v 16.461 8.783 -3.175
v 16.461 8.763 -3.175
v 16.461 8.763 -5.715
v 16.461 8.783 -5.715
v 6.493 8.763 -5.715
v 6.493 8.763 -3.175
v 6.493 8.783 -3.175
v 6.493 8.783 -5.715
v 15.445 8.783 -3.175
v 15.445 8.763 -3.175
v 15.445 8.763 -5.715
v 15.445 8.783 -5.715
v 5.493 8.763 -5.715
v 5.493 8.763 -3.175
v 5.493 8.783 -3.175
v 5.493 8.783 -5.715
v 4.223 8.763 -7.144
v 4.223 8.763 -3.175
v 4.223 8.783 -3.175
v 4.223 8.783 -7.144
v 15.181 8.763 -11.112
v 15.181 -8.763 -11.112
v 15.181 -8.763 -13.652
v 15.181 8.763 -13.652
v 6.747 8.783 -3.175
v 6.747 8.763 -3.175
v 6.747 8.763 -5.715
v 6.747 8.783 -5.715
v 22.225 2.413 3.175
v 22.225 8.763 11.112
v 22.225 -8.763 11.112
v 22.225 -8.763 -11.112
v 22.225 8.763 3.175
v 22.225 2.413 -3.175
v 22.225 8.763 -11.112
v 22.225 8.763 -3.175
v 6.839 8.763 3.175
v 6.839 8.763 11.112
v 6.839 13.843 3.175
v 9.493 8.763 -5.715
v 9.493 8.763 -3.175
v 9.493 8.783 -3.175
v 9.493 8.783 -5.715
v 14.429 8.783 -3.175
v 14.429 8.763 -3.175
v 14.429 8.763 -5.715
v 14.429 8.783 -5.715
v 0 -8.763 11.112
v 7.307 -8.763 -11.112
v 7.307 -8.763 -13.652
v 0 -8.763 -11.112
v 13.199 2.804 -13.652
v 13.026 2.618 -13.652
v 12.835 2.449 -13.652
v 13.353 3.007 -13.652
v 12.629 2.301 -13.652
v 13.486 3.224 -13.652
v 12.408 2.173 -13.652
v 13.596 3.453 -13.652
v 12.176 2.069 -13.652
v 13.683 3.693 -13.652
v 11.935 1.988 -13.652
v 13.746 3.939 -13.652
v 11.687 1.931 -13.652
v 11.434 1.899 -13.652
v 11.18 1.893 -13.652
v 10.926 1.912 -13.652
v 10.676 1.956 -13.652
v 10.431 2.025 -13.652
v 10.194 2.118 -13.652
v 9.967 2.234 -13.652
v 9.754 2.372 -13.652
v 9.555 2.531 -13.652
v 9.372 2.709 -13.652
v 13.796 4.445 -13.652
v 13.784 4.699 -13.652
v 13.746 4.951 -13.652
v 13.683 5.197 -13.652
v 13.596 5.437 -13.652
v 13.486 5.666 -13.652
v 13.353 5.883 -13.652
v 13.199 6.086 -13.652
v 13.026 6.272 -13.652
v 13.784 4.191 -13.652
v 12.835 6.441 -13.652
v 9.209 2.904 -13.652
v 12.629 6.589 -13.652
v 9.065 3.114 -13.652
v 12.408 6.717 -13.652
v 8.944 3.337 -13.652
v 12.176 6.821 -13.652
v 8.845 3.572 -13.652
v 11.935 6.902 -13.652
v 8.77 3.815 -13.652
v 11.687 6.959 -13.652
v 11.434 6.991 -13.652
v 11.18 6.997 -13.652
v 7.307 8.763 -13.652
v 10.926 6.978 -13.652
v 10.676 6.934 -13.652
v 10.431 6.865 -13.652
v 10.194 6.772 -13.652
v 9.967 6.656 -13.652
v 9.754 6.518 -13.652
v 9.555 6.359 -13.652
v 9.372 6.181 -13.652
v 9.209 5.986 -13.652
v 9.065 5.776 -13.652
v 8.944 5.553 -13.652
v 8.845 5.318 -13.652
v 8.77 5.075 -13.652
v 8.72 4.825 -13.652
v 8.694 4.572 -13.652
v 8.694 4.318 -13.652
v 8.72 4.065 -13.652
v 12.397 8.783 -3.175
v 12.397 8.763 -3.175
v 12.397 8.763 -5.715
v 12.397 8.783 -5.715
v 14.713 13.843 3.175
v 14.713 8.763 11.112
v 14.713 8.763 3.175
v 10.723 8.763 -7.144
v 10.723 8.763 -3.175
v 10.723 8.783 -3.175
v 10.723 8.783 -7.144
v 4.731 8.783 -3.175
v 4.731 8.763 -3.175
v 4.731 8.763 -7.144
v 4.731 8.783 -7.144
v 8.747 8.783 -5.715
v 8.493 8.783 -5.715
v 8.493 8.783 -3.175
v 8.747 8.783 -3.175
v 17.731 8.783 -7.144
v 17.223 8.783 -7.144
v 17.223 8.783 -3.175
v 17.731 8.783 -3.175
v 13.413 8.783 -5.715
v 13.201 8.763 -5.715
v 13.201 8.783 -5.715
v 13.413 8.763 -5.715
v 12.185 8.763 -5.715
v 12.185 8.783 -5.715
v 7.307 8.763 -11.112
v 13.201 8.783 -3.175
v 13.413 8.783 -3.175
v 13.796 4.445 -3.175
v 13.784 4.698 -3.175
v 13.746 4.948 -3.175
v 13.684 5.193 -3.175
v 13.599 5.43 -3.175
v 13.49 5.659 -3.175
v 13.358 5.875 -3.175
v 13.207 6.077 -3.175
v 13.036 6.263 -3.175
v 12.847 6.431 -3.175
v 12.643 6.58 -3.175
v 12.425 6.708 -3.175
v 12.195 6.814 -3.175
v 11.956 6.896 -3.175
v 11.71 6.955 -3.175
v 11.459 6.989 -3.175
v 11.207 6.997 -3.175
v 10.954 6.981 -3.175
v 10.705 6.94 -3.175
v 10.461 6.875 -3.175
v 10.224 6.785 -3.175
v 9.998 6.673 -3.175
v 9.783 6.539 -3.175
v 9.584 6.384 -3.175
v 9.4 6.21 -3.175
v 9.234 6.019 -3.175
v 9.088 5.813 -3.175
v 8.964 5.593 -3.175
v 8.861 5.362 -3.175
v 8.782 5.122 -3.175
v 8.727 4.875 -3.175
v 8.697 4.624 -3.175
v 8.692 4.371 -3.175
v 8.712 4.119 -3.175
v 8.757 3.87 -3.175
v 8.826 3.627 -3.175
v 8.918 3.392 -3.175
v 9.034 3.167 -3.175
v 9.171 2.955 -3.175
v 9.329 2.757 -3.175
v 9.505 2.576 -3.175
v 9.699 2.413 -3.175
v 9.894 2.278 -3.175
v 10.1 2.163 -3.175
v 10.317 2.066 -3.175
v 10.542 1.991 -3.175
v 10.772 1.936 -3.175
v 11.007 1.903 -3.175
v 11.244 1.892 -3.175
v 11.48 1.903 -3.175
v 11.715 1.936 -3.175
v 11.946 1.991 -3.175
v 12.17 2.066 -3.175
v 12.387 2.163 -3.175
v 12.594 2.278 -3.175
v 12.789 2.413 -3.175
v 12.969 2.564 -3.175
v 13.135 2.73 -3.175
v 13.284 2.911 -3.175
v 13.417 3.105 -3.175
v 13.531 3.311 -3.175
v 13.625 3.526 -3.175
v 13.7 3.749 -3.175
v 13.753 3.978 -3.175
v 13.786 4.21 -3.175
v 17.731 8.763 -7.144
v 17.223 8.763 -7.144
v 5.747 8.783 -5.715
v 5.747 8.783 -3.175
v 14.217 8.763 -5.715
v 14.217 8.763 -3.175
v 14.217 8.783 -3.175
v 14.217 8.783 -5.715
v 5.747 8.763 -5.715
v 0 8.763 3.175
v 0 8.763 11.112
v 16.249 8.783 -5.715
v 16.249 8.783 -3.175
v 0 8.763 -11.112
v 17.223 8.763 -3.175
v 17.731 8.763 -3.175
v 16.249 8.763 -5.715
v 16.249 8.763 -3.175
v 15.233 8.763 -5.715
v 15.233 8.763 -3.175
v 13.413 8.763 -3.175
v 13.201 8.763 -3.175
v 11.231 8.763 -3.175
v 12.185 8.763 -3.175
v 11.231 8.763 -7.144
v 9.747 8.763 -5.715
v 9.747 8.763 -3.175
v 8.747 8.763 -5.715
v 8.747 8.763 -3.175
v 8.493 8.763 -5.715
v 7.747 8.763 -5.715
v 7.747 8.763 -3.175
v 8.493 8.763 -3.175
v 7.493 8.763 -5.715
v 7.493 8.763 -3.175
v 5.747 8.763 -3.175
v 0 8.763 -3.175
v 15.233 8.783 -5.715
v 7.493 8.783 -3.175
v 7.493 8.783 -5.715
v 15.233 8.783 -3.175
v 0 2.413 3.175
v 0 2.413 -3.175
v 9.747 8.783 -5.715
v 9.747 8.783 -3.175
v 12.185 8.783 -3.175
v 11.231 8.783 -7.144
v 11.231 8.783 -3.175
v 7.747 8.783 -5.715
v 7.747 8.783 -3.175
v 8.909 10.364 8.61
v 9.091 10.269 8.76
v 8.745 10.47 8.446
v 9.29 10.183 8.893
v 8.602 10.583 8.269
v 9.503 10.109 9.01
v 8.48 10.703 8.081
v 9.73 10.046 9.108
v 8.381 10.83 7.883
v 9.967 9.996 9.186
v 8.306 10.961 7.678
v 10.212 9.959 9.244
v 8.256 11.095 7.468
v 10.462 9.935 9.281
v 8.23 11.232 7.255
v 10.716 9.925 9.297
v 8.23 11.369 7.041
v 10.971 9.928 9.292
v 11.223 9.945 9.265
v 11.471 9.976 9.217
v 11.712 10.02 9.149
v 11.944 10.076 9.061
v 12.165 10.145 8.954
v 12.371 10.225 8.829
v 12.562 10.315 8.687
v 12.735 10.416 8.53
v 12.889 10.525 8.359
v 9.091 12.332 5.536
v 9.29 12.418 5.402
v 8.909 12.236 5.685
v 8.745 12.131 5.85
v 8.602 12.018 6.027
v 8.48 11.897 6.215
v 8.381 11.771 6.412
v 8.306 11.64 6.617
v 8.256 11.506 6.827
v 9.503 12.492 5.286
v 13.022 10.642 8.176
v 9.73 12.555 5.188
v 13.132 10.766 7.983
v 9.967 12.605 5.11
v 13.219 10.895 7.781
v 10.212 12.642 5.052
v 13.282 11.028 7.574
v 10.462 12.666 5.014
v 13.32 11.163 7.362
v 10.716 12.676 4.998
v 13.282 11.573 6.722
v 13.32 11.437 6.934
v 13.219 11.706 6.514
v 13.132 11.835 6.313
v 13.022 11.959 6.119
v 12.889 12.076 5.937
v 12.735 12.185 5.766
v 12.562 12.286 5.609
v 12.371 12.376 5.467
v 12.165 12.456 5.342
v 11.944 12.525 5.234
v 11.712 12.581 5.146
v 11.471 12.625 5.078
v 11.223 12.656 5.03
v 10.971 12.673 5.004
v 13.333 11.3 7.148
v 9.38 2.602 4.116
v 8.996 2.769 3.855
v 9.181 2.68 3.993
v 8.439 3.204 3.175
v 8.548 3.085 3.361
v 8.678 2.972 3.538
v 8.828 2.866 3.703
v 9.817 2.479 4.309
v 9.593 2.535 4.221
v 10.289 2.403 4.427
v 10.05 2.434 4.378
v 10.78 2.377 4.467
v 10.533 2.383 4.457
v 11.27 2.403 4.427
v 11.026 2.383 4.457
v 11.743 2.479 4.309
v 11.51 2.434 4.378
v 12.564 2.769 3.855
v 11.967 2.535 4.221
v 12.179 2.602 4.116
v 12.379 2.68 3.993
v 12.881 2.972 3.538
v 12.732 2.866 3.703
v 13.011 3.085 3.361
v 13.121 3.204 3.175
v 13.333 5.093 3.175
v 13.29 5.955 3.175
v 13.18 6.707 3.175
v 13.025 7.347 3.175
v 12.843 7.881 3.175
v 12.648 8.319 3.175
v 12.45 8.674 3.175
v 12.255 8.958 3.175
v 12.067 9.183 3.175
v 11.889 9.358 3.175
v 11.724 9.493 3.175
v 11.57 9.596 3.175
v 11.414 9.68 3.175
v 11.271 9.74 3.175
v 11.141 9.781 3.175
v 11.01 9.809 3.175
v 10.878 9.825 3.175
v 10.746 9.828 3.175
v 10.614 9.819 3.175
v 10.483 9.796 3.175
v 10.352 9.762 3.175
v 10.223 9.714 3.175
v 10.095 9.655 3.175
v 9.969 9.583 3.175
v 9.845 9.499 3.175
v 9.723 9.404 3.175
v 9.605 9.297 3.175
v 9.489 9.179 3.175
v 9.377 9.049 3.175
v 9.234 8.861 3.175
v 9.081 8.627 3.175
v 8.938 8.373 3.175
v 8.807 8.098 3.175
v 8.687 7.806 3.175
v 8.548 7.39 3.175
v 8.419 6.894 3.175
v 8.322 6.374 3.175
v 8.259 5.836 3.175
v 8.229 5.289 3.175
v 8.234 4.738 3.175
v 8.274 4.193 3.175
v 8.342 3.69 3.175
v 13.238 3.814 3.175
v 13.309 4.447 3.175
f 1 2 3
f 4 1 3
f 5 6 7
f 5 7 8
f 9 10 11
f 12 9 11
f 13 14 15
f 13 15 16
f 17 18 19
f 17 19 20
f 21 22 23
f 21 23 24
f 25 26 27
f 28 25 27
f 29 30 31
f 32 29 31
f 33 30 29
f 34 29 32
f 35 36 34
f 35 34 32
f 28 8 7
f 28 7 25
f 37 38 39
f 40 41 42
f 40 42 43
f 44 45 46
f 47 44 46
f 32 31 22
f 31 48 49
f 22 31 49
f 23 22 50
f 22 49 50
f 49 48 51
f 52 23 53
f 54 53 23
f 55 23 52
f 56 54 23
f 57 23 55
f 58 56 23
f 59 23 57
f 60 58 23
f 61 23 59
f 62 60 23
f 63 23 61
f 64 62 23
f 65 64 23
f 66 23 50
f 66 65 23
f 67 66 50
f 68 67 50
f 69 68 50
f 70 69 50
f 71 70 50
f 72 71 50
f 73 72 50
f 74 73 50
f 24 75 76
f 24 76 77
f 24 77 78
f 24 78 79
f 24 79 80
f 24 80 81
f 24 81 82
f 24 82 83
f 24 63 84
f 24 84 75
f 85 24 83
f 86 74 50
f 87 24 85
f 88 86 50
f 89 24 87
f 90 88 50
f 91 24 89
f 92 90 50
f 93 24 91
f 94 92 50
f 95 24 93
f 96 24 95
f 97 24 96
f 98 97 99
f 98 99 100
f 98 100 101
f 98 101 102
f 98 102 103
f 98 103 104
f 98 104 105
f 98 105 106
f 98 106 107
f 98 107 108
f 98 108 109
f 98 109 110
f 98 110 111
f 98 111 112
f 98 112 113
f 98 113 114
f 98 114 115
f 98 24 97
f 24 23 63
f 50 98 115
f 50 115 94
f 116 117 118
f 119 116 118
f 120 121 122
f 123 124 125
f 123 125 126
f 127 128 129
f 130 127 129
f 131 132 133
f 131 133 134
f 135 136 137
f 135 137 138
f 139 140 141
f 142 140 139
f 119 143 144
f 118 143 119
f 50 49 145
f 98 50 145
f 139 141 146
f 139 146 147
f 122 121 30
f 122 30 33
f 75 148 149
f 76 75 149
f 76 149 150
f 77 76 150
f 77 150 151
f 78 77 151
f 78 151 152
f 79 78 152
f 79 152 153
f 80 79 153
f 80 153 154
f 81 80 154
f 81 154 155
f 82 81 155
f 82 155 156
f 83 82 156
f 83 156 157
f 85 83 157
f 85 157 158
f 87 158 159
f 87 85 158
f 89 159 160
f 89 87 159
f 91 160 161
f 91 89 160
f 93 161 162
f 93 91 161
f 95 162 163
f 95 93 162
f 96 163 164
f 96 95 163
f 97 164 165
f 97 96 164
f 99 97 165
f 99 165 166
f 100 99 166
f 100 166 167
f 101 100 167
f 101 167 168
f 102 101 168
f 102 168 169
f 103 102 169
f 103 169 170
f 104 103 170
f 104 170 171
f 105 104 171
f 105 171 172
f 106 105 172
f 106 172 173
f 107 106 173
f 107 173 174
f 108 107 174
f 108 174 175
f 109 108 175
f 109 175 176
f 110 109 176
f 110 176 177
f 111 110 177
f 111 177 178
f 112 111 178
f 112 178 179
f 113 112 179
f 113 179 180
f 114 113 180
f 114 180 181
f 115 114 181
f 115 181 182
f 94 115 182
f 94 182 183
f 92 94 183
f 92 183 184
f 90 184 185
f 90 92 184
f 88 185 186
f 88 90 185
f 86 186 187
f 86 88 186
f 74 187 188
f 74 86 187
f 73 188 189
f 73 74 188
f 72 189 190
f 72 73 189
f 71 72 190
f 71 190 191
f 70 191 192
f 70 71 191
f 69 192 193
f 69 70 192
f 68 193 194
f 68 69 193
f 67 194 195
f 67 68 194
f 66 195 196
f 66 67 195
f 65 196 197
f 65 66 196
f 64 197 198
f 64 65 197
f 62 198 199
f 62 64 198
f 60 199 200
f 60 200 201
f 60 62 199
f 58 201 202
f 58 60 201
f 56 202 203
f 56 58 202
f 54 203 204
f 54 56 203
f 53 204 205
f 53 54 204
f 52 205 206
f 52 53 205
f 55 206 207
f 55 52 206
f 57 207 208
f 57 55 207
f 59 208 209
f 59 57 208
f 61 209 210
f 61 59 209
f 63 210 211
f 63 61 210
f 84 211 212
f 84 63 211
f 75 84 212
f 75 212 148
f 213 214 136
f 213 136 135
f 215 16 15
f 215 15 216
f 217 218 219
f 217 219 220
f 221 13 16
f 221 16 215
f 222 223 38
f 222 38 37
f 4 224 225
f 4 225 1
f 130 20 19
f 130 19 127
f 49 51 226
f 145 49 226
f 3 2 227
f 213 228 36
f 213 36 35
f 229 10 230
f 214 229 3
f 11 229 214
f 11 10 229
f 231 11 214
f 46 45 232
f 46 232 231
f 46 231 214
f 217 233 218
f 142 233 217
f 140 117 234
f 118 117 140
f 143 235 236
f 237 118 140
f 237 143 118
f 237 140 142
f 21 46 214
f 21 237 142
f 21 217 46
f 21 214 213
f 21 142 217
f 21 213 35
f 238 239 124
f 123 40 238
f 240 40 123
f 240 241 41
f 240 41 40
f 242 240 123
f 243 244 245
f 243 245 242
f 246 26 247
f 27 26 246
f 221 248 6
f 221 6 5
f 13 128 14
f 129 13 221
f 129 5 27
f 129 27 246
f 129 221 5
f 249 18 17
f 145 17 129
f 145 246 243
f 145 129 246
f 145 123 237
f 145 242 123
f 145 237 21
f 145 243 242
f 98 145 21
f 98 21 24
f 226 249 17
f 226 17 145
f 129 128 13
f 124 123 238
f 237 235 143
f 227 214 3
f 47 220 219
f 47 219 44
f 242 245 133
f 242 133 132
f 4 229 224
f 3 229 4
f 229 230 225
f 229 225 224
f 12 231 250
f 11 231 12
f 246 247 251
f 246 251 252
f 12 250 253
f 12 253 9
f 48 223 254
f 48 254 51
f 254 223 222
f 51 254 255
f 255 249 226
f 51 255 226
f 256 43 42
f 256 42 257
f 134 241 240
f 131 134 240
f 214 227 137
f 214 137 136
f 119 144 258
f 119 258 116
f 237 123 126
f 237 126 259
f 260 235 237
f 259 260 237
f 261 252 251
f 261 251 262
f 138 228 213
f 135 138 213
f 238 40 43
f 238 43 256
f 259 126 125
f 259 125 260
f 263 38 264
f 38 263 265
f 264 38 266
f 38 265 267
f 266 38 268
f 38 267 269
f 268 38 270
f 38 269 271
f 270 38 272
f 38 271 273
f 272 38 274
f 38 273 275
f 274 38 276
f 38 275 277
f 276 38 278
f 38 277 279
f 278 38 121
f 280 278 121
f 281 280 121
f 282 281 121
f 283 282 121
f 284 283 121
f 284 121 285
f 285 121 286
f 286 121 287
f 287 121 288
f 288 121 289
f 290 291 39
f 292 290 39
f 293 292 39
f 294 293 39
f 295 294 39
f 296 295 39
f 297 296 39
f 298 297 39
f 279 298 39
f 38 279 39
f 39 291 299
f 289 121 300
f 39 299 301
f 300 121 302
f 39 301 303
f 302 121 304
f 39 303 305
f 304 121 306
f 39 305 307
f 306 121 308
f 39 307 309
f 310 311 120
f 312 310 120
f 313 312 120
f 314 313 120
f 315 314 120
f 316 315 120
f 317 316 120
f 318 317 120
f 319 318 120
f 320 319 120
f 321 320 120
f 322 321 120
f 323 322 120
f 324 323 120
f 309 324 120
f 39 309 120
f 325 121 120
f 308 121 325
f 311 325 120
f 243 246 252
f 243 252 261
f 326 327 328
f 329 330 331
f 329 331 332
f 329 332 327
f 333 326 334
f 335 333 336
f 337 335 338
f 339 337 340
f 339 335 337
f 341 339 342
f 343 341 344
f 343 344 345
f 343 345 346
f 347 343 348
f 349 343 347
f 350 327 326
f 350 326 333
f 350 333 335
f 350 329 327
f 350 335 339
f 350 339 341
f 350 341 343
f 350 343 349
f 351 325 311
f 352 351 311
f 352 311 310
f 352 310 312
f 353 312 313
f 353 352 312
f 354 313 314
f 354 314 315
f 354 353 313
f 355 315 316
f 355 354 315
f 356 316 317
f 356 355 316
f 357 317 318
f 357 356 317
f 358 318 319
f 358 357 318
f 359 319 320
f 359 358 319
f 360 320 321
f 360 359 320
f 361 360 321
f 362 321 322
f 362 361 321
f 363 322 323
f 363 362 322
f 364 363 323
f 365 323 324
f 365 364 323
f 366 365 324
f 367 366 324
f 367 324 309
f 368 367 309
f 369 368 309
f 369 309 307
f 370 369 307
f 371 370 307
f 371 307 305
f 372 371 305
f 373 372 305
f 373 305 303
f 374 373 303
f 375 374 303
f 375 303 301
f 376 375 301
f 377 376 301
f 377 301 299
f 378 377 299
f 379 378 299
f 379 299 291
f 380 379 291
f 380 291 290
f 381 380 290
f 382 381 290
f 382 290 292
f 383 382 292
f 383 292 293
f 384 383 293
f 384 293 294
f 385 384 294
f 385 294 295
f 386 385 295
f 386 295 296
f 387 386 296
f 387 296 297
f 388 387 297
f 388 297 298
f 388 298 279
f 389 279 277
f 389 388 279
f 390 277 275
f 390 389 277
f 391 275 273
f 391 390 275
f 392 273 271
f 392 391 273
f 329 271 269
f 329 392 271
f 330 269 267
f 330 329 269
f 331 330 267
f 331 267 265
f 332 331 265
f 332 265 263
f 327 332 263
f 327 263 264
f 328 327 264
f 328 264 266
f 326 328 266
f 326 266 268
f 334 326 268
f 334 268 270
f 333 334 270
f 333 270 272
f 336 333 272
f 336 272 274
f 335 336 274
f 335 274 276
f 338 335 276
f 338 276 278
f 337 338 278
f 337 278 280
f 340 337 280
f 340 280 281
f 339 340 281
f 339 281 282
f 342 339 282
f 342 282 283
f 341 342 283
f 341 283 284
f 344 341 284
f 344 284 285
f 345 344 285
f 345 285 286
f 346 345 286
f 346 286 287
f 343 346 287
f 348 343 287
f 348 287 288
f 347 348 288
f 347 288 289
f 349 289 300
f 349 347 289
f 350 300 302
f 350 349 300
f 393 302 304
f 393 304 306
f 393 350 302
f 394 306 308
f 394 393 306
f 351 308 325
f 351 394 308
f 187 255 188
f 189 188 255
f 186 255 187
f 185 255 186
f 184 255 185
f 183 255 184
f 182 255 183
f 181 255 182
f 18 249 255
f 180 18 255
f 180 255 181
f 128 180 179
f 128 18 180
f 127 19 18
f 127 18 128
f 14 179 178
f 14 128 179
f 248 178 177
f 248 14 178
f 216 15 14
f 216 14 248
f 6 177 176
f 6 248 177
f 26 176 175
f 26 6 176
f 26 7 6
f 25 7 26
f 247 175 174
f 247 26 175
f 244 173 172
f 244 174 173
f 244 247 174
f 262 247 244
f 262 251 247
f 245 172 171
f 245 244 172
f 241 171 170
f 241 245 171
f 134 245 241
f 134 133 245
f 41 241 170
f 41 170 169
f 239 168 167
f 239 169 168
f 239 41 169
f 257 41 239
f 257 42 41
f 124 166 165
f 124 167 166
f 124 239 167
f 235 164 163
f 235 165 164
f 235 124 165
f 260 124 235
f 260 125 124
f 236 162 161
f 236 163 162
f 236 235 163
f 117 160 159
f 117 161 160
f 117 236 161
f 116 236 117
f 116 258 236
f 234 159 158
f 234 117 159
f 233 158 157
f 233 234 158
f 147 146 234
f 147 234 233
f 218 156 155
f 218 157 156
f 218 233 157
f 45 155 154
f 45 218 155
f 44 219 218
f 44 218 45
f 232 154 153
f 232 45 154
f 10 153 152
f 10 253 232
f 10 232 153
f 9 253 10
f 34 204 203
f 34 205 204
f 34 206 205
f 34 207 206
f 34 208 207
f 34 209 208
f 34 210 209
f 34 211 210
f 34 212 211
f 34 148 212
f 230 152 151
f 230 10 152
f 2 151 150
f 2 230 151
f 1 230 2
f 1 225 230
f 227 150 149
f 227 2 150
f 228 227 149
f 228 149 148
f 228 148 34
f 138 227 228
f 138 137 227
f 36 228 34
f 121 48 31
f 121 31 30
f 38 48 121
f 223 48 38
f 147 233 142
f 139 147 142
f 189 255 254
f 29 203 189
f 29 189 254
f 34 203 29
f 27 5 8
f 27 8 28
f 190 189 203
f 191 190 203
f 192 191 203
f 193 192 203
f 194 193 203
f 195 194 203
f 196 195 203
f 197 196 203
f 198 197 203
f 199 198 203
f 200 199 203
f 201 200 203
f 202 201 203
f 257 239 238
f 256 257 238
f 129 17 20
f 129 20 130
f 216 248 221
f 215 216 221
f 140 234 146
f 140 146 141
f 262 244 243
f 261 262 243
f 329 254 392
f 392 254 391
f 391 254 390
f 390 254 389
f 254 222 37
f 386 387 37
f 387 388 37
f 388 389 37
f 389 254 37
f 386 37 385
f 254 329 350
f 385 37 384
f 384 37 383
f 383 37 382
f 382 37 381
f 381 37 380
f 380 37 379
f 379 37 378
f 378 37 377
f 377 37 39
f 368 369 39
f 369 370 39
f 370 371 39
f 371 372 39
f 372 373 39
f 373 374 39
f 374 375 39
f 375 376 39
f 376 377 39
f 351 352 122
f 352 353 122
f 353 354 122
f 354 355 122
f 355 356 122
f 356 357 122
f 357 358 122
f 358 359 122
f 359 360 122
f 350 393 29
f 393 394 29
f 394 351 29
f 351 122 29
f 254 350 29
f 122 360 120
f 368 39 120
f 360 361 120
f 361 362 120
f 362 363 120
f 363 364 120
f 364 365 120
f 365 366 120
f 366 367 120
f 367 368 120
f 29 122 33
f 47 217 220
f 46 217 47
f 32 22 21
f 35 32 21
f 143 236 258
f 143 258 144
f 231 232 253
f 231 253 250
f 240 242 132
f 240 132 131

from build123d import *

# Parameters (mm, degrees)
SKETCH1_W                       = 22.225
SKETCH1_H                       = 17.526
BOSS_EXTRUDE1_DEPTH             = 22.225
SKETCH2_W                       = 7.874
SKETCH2_H                       = 17.526
BOSS_EXTRUDE2_DEPTH             = 2.54
SKETCH3_W                       = 22.225
SKETCH3_H                       = 6.35
CUT_EXTRUDE1_DEPTH              = 6.35
SKETCH5_W                       = 7.874
SKETCH5_H                       = 7.9375
BOSS_EXTRUDE3_DEPTH             = 5.08
F_1_4_20_START                  = -13.6525
F_1_4_20_TAPPED_HOLE1_OUTLINE_R = 2.5527
F_1_4_20_TAPPED_HOLE1_DEPTH     = 10.4775
CUT_EXTRUDE3_REACH              = 26.382
F_1_4_20_START_2                = 4.410249561
F_1_4_20_TAPPED_HOLE2_OUTLINE_R = 2.5527
F_1_4_20_TAPPED_HOLE2_DEPTH     = 8.960808925
SKETCH21_W                      = 0.508
SKETCH21_H                      = 3.96875
BOSS_EXTRUDE4_DEPTH             = 0.02
LPATTERN1_COUNT                 = 3
LPATTERN1_PITCH                 = 6.5
SKETCH22_W                      = 0.211811424
SKETCH22_H                      = 2.54
BOSS_EXTRUDE5_DEPTH             = 0.02
LPATTERN2_COUNT                 = 5
LPATTERN2_PITCH                 = 1.016
SKETCH23_W                      = 0.254
SKETCH23_H                      = 2.54
BOSS_EXTRUDE6_DEPTH             = 0.02
LPATTERN3_COUNT                 = 5
LPATTERN3_PITCH                 = 1


# Read off the part's stored shape, not the designer's step: 1/4-20 Tapped Hole1, 1/4-20 Tapped Hole2
with BuildPart() as part:
    # Sketch1 → Boss-Extrude1 (new body)
    with BuildSketch(Plane(origin=(0, 0, 0), x_dir=(0, 0, -1), z_dir=(1, 0, 0))):
        Rectangle(SKETCH1_W, SKETCH1_H)
    extrude(amount=BOSS_EXTRUDE1_DEPTH)

    # Sketch2 → Boss-Extrude2 (add)
    with BuildSketch(Plane(origin=(0, 0, -11.1125), x_dir=(-1, 0, 0), z_dir=(0, 0, -1))):
        with Locations((-11.243689687, 0)):
            Rectangle(SKETCH2_W, SKETCH2_H)
    extrude(amount=BOSS_EXTRUDE2_DEPTH)

    # Sketch3 → Cut-Extrude1 (cut)
    with BuildSketch(Plane(origin=(0, 8.763, 0), x_dir=(1, 0, 0), z_dir=(0, 1, 0))):
        with Locations((11.1125, 0)):
            Rectangle(SKETCH3_W, SKETCH3_H)
    extrude(amount=-CUT_EXTRUDE1_DEPTH, mode=Mode.SUBTRACT)

    # Sketch5 → Boss-Extrude3 (add)
    with BuildSketch(Plane(origin=(0, 8.763, 0), x_dir=(1, 0, 0), z_dir=(0, 1, 0))):
        with Locations((10.776161326, -7.14375)):
            Rectangle(SKETCH5_W, SKETCH5_H)
    extrude(amount=BOSS_EXTRUDE3_DEPTH)

    # 1/4-20 Tapped Hole1 outline → 1/4-20 Tapped Hole1 (cut)
    with BuildSketch(Plane.XY.offset(F_1_4_20_START)):
        with Locations((11.243689687, 4.445)):
            Circle(F_1_4_20_TAPPED_HOLE1_OUTLINE_R)
    extrude(amount=F_1_4_20_TAPPED_HOLE1_DEPTH, mode=Mode.SUBTRACT)

    # Sketch6 → Cut-Extrude3 (cut, up to next)
    with BuildSketch(Plane(origin=(14.713161326, 0, 0), x_dir=(0, 0, -1), z_dir=(1, 0, 0)), mode=Mode.PRIVATE) as cut_extrude3_sk1:
        Polygon((-11.1125, 8.763), (-3.175, 13.843), (-11.1125, 13.843), align=None)
    cut_extrude3_tool1 = extrude(cut_extrude3_sk1.sketch, amount=-CUT_EXTRUDE3_REACH, mode=Mode.PRIVATE) & part.part
    add(cut_extrude3_tool1.solids().sort_by_distance((14.713161, 12.149667, 8.466667))[0], mode=Mode.SUBTRACT)

    # 1/4-20 Tapped Hole2 outline → 1/4-20 Tapped Hole2 (cut)
    with BuildSketch(Plane(origin=(0, 0, 0), x_dir=(1, 0, 0), z_dir=(0, 0.842271400661511, 0.539053696423368)).offset(F_1_4_20_START_2)):
        with Locations((10.779806469, 0.071193023)):
            Circle(F_1_4_20_TAPPED_HOLE2_OUTLINE_R)
    extrude(amount=F_1_4_20_TAPPED_HOLE2_DEPTH, mode=Mode.SUBTRACT)

    # Sketch21 → Boss-Extrude4 (add)
    with BuildSketch(Plane(origin=(0, 8.763, 0), x_dir=(1, 0, 0), z_dir=(0, 1, 0))):
        with Locations((17.4768928, 5.159375)):
            Rectangle(SKETCH21_W, SKETCH21_H)
    boss_extrude4 = extrude(amount=BOSS_EXTRUDE4_DEPTH)

    # LPattern1: Boss-Extrude4 ×3
    with Locations(*[(-i * LPATTERN1_PITCH, 0, 0) for i in range(1, LPATTERN1_COUNT)]):
        add(boss_extrude4)

    # Sketch22 → Boss-Extrude5 (add)
    with BuildSketch(Plane(origin=(0, 8.763, 0), x_dir=(1, 0, 0), z_dir=(0, 1, 0))):
        with Locations((16.354987088, 4.445)):
            Rectangle(SKETCH22_W, SKETCH22_H)
    boss_extrude5 = extrude(amount=BOSS_EXTRUDE5_DEPTH)

    # LPattern2: Boss-Extrude5 ×5
    with Locations(*[(-i * LPATTERN2_PITCH, 0, 0) for i in range(1, LPATTERN2_COUNT)]):
        add(boss_extrude5)

    # Sketch23 → Boss-Extrude6 (add)
    with BuildSketch(Plane(origin=(0, 8.763, 0), x_dir=(1, 0, 0), z_dir=(0, 1, 0))):
        with Locations((5.6198928, 4.445)):
            Rectangle(SKETCH23_W, SKETCH23_H)
    boss_extrude6 = extrude(amount=BOSS_EXTRUDE6_DEPTH)

    # LPattern3: Boss-Extrude6 ×5
    with Locations(*[(i * LPATTERN3_PITCH, 0, 0) for i in range(1, LPATTERN3_COUNT)]):
        add(boss_extrude6)


solid = part.part
